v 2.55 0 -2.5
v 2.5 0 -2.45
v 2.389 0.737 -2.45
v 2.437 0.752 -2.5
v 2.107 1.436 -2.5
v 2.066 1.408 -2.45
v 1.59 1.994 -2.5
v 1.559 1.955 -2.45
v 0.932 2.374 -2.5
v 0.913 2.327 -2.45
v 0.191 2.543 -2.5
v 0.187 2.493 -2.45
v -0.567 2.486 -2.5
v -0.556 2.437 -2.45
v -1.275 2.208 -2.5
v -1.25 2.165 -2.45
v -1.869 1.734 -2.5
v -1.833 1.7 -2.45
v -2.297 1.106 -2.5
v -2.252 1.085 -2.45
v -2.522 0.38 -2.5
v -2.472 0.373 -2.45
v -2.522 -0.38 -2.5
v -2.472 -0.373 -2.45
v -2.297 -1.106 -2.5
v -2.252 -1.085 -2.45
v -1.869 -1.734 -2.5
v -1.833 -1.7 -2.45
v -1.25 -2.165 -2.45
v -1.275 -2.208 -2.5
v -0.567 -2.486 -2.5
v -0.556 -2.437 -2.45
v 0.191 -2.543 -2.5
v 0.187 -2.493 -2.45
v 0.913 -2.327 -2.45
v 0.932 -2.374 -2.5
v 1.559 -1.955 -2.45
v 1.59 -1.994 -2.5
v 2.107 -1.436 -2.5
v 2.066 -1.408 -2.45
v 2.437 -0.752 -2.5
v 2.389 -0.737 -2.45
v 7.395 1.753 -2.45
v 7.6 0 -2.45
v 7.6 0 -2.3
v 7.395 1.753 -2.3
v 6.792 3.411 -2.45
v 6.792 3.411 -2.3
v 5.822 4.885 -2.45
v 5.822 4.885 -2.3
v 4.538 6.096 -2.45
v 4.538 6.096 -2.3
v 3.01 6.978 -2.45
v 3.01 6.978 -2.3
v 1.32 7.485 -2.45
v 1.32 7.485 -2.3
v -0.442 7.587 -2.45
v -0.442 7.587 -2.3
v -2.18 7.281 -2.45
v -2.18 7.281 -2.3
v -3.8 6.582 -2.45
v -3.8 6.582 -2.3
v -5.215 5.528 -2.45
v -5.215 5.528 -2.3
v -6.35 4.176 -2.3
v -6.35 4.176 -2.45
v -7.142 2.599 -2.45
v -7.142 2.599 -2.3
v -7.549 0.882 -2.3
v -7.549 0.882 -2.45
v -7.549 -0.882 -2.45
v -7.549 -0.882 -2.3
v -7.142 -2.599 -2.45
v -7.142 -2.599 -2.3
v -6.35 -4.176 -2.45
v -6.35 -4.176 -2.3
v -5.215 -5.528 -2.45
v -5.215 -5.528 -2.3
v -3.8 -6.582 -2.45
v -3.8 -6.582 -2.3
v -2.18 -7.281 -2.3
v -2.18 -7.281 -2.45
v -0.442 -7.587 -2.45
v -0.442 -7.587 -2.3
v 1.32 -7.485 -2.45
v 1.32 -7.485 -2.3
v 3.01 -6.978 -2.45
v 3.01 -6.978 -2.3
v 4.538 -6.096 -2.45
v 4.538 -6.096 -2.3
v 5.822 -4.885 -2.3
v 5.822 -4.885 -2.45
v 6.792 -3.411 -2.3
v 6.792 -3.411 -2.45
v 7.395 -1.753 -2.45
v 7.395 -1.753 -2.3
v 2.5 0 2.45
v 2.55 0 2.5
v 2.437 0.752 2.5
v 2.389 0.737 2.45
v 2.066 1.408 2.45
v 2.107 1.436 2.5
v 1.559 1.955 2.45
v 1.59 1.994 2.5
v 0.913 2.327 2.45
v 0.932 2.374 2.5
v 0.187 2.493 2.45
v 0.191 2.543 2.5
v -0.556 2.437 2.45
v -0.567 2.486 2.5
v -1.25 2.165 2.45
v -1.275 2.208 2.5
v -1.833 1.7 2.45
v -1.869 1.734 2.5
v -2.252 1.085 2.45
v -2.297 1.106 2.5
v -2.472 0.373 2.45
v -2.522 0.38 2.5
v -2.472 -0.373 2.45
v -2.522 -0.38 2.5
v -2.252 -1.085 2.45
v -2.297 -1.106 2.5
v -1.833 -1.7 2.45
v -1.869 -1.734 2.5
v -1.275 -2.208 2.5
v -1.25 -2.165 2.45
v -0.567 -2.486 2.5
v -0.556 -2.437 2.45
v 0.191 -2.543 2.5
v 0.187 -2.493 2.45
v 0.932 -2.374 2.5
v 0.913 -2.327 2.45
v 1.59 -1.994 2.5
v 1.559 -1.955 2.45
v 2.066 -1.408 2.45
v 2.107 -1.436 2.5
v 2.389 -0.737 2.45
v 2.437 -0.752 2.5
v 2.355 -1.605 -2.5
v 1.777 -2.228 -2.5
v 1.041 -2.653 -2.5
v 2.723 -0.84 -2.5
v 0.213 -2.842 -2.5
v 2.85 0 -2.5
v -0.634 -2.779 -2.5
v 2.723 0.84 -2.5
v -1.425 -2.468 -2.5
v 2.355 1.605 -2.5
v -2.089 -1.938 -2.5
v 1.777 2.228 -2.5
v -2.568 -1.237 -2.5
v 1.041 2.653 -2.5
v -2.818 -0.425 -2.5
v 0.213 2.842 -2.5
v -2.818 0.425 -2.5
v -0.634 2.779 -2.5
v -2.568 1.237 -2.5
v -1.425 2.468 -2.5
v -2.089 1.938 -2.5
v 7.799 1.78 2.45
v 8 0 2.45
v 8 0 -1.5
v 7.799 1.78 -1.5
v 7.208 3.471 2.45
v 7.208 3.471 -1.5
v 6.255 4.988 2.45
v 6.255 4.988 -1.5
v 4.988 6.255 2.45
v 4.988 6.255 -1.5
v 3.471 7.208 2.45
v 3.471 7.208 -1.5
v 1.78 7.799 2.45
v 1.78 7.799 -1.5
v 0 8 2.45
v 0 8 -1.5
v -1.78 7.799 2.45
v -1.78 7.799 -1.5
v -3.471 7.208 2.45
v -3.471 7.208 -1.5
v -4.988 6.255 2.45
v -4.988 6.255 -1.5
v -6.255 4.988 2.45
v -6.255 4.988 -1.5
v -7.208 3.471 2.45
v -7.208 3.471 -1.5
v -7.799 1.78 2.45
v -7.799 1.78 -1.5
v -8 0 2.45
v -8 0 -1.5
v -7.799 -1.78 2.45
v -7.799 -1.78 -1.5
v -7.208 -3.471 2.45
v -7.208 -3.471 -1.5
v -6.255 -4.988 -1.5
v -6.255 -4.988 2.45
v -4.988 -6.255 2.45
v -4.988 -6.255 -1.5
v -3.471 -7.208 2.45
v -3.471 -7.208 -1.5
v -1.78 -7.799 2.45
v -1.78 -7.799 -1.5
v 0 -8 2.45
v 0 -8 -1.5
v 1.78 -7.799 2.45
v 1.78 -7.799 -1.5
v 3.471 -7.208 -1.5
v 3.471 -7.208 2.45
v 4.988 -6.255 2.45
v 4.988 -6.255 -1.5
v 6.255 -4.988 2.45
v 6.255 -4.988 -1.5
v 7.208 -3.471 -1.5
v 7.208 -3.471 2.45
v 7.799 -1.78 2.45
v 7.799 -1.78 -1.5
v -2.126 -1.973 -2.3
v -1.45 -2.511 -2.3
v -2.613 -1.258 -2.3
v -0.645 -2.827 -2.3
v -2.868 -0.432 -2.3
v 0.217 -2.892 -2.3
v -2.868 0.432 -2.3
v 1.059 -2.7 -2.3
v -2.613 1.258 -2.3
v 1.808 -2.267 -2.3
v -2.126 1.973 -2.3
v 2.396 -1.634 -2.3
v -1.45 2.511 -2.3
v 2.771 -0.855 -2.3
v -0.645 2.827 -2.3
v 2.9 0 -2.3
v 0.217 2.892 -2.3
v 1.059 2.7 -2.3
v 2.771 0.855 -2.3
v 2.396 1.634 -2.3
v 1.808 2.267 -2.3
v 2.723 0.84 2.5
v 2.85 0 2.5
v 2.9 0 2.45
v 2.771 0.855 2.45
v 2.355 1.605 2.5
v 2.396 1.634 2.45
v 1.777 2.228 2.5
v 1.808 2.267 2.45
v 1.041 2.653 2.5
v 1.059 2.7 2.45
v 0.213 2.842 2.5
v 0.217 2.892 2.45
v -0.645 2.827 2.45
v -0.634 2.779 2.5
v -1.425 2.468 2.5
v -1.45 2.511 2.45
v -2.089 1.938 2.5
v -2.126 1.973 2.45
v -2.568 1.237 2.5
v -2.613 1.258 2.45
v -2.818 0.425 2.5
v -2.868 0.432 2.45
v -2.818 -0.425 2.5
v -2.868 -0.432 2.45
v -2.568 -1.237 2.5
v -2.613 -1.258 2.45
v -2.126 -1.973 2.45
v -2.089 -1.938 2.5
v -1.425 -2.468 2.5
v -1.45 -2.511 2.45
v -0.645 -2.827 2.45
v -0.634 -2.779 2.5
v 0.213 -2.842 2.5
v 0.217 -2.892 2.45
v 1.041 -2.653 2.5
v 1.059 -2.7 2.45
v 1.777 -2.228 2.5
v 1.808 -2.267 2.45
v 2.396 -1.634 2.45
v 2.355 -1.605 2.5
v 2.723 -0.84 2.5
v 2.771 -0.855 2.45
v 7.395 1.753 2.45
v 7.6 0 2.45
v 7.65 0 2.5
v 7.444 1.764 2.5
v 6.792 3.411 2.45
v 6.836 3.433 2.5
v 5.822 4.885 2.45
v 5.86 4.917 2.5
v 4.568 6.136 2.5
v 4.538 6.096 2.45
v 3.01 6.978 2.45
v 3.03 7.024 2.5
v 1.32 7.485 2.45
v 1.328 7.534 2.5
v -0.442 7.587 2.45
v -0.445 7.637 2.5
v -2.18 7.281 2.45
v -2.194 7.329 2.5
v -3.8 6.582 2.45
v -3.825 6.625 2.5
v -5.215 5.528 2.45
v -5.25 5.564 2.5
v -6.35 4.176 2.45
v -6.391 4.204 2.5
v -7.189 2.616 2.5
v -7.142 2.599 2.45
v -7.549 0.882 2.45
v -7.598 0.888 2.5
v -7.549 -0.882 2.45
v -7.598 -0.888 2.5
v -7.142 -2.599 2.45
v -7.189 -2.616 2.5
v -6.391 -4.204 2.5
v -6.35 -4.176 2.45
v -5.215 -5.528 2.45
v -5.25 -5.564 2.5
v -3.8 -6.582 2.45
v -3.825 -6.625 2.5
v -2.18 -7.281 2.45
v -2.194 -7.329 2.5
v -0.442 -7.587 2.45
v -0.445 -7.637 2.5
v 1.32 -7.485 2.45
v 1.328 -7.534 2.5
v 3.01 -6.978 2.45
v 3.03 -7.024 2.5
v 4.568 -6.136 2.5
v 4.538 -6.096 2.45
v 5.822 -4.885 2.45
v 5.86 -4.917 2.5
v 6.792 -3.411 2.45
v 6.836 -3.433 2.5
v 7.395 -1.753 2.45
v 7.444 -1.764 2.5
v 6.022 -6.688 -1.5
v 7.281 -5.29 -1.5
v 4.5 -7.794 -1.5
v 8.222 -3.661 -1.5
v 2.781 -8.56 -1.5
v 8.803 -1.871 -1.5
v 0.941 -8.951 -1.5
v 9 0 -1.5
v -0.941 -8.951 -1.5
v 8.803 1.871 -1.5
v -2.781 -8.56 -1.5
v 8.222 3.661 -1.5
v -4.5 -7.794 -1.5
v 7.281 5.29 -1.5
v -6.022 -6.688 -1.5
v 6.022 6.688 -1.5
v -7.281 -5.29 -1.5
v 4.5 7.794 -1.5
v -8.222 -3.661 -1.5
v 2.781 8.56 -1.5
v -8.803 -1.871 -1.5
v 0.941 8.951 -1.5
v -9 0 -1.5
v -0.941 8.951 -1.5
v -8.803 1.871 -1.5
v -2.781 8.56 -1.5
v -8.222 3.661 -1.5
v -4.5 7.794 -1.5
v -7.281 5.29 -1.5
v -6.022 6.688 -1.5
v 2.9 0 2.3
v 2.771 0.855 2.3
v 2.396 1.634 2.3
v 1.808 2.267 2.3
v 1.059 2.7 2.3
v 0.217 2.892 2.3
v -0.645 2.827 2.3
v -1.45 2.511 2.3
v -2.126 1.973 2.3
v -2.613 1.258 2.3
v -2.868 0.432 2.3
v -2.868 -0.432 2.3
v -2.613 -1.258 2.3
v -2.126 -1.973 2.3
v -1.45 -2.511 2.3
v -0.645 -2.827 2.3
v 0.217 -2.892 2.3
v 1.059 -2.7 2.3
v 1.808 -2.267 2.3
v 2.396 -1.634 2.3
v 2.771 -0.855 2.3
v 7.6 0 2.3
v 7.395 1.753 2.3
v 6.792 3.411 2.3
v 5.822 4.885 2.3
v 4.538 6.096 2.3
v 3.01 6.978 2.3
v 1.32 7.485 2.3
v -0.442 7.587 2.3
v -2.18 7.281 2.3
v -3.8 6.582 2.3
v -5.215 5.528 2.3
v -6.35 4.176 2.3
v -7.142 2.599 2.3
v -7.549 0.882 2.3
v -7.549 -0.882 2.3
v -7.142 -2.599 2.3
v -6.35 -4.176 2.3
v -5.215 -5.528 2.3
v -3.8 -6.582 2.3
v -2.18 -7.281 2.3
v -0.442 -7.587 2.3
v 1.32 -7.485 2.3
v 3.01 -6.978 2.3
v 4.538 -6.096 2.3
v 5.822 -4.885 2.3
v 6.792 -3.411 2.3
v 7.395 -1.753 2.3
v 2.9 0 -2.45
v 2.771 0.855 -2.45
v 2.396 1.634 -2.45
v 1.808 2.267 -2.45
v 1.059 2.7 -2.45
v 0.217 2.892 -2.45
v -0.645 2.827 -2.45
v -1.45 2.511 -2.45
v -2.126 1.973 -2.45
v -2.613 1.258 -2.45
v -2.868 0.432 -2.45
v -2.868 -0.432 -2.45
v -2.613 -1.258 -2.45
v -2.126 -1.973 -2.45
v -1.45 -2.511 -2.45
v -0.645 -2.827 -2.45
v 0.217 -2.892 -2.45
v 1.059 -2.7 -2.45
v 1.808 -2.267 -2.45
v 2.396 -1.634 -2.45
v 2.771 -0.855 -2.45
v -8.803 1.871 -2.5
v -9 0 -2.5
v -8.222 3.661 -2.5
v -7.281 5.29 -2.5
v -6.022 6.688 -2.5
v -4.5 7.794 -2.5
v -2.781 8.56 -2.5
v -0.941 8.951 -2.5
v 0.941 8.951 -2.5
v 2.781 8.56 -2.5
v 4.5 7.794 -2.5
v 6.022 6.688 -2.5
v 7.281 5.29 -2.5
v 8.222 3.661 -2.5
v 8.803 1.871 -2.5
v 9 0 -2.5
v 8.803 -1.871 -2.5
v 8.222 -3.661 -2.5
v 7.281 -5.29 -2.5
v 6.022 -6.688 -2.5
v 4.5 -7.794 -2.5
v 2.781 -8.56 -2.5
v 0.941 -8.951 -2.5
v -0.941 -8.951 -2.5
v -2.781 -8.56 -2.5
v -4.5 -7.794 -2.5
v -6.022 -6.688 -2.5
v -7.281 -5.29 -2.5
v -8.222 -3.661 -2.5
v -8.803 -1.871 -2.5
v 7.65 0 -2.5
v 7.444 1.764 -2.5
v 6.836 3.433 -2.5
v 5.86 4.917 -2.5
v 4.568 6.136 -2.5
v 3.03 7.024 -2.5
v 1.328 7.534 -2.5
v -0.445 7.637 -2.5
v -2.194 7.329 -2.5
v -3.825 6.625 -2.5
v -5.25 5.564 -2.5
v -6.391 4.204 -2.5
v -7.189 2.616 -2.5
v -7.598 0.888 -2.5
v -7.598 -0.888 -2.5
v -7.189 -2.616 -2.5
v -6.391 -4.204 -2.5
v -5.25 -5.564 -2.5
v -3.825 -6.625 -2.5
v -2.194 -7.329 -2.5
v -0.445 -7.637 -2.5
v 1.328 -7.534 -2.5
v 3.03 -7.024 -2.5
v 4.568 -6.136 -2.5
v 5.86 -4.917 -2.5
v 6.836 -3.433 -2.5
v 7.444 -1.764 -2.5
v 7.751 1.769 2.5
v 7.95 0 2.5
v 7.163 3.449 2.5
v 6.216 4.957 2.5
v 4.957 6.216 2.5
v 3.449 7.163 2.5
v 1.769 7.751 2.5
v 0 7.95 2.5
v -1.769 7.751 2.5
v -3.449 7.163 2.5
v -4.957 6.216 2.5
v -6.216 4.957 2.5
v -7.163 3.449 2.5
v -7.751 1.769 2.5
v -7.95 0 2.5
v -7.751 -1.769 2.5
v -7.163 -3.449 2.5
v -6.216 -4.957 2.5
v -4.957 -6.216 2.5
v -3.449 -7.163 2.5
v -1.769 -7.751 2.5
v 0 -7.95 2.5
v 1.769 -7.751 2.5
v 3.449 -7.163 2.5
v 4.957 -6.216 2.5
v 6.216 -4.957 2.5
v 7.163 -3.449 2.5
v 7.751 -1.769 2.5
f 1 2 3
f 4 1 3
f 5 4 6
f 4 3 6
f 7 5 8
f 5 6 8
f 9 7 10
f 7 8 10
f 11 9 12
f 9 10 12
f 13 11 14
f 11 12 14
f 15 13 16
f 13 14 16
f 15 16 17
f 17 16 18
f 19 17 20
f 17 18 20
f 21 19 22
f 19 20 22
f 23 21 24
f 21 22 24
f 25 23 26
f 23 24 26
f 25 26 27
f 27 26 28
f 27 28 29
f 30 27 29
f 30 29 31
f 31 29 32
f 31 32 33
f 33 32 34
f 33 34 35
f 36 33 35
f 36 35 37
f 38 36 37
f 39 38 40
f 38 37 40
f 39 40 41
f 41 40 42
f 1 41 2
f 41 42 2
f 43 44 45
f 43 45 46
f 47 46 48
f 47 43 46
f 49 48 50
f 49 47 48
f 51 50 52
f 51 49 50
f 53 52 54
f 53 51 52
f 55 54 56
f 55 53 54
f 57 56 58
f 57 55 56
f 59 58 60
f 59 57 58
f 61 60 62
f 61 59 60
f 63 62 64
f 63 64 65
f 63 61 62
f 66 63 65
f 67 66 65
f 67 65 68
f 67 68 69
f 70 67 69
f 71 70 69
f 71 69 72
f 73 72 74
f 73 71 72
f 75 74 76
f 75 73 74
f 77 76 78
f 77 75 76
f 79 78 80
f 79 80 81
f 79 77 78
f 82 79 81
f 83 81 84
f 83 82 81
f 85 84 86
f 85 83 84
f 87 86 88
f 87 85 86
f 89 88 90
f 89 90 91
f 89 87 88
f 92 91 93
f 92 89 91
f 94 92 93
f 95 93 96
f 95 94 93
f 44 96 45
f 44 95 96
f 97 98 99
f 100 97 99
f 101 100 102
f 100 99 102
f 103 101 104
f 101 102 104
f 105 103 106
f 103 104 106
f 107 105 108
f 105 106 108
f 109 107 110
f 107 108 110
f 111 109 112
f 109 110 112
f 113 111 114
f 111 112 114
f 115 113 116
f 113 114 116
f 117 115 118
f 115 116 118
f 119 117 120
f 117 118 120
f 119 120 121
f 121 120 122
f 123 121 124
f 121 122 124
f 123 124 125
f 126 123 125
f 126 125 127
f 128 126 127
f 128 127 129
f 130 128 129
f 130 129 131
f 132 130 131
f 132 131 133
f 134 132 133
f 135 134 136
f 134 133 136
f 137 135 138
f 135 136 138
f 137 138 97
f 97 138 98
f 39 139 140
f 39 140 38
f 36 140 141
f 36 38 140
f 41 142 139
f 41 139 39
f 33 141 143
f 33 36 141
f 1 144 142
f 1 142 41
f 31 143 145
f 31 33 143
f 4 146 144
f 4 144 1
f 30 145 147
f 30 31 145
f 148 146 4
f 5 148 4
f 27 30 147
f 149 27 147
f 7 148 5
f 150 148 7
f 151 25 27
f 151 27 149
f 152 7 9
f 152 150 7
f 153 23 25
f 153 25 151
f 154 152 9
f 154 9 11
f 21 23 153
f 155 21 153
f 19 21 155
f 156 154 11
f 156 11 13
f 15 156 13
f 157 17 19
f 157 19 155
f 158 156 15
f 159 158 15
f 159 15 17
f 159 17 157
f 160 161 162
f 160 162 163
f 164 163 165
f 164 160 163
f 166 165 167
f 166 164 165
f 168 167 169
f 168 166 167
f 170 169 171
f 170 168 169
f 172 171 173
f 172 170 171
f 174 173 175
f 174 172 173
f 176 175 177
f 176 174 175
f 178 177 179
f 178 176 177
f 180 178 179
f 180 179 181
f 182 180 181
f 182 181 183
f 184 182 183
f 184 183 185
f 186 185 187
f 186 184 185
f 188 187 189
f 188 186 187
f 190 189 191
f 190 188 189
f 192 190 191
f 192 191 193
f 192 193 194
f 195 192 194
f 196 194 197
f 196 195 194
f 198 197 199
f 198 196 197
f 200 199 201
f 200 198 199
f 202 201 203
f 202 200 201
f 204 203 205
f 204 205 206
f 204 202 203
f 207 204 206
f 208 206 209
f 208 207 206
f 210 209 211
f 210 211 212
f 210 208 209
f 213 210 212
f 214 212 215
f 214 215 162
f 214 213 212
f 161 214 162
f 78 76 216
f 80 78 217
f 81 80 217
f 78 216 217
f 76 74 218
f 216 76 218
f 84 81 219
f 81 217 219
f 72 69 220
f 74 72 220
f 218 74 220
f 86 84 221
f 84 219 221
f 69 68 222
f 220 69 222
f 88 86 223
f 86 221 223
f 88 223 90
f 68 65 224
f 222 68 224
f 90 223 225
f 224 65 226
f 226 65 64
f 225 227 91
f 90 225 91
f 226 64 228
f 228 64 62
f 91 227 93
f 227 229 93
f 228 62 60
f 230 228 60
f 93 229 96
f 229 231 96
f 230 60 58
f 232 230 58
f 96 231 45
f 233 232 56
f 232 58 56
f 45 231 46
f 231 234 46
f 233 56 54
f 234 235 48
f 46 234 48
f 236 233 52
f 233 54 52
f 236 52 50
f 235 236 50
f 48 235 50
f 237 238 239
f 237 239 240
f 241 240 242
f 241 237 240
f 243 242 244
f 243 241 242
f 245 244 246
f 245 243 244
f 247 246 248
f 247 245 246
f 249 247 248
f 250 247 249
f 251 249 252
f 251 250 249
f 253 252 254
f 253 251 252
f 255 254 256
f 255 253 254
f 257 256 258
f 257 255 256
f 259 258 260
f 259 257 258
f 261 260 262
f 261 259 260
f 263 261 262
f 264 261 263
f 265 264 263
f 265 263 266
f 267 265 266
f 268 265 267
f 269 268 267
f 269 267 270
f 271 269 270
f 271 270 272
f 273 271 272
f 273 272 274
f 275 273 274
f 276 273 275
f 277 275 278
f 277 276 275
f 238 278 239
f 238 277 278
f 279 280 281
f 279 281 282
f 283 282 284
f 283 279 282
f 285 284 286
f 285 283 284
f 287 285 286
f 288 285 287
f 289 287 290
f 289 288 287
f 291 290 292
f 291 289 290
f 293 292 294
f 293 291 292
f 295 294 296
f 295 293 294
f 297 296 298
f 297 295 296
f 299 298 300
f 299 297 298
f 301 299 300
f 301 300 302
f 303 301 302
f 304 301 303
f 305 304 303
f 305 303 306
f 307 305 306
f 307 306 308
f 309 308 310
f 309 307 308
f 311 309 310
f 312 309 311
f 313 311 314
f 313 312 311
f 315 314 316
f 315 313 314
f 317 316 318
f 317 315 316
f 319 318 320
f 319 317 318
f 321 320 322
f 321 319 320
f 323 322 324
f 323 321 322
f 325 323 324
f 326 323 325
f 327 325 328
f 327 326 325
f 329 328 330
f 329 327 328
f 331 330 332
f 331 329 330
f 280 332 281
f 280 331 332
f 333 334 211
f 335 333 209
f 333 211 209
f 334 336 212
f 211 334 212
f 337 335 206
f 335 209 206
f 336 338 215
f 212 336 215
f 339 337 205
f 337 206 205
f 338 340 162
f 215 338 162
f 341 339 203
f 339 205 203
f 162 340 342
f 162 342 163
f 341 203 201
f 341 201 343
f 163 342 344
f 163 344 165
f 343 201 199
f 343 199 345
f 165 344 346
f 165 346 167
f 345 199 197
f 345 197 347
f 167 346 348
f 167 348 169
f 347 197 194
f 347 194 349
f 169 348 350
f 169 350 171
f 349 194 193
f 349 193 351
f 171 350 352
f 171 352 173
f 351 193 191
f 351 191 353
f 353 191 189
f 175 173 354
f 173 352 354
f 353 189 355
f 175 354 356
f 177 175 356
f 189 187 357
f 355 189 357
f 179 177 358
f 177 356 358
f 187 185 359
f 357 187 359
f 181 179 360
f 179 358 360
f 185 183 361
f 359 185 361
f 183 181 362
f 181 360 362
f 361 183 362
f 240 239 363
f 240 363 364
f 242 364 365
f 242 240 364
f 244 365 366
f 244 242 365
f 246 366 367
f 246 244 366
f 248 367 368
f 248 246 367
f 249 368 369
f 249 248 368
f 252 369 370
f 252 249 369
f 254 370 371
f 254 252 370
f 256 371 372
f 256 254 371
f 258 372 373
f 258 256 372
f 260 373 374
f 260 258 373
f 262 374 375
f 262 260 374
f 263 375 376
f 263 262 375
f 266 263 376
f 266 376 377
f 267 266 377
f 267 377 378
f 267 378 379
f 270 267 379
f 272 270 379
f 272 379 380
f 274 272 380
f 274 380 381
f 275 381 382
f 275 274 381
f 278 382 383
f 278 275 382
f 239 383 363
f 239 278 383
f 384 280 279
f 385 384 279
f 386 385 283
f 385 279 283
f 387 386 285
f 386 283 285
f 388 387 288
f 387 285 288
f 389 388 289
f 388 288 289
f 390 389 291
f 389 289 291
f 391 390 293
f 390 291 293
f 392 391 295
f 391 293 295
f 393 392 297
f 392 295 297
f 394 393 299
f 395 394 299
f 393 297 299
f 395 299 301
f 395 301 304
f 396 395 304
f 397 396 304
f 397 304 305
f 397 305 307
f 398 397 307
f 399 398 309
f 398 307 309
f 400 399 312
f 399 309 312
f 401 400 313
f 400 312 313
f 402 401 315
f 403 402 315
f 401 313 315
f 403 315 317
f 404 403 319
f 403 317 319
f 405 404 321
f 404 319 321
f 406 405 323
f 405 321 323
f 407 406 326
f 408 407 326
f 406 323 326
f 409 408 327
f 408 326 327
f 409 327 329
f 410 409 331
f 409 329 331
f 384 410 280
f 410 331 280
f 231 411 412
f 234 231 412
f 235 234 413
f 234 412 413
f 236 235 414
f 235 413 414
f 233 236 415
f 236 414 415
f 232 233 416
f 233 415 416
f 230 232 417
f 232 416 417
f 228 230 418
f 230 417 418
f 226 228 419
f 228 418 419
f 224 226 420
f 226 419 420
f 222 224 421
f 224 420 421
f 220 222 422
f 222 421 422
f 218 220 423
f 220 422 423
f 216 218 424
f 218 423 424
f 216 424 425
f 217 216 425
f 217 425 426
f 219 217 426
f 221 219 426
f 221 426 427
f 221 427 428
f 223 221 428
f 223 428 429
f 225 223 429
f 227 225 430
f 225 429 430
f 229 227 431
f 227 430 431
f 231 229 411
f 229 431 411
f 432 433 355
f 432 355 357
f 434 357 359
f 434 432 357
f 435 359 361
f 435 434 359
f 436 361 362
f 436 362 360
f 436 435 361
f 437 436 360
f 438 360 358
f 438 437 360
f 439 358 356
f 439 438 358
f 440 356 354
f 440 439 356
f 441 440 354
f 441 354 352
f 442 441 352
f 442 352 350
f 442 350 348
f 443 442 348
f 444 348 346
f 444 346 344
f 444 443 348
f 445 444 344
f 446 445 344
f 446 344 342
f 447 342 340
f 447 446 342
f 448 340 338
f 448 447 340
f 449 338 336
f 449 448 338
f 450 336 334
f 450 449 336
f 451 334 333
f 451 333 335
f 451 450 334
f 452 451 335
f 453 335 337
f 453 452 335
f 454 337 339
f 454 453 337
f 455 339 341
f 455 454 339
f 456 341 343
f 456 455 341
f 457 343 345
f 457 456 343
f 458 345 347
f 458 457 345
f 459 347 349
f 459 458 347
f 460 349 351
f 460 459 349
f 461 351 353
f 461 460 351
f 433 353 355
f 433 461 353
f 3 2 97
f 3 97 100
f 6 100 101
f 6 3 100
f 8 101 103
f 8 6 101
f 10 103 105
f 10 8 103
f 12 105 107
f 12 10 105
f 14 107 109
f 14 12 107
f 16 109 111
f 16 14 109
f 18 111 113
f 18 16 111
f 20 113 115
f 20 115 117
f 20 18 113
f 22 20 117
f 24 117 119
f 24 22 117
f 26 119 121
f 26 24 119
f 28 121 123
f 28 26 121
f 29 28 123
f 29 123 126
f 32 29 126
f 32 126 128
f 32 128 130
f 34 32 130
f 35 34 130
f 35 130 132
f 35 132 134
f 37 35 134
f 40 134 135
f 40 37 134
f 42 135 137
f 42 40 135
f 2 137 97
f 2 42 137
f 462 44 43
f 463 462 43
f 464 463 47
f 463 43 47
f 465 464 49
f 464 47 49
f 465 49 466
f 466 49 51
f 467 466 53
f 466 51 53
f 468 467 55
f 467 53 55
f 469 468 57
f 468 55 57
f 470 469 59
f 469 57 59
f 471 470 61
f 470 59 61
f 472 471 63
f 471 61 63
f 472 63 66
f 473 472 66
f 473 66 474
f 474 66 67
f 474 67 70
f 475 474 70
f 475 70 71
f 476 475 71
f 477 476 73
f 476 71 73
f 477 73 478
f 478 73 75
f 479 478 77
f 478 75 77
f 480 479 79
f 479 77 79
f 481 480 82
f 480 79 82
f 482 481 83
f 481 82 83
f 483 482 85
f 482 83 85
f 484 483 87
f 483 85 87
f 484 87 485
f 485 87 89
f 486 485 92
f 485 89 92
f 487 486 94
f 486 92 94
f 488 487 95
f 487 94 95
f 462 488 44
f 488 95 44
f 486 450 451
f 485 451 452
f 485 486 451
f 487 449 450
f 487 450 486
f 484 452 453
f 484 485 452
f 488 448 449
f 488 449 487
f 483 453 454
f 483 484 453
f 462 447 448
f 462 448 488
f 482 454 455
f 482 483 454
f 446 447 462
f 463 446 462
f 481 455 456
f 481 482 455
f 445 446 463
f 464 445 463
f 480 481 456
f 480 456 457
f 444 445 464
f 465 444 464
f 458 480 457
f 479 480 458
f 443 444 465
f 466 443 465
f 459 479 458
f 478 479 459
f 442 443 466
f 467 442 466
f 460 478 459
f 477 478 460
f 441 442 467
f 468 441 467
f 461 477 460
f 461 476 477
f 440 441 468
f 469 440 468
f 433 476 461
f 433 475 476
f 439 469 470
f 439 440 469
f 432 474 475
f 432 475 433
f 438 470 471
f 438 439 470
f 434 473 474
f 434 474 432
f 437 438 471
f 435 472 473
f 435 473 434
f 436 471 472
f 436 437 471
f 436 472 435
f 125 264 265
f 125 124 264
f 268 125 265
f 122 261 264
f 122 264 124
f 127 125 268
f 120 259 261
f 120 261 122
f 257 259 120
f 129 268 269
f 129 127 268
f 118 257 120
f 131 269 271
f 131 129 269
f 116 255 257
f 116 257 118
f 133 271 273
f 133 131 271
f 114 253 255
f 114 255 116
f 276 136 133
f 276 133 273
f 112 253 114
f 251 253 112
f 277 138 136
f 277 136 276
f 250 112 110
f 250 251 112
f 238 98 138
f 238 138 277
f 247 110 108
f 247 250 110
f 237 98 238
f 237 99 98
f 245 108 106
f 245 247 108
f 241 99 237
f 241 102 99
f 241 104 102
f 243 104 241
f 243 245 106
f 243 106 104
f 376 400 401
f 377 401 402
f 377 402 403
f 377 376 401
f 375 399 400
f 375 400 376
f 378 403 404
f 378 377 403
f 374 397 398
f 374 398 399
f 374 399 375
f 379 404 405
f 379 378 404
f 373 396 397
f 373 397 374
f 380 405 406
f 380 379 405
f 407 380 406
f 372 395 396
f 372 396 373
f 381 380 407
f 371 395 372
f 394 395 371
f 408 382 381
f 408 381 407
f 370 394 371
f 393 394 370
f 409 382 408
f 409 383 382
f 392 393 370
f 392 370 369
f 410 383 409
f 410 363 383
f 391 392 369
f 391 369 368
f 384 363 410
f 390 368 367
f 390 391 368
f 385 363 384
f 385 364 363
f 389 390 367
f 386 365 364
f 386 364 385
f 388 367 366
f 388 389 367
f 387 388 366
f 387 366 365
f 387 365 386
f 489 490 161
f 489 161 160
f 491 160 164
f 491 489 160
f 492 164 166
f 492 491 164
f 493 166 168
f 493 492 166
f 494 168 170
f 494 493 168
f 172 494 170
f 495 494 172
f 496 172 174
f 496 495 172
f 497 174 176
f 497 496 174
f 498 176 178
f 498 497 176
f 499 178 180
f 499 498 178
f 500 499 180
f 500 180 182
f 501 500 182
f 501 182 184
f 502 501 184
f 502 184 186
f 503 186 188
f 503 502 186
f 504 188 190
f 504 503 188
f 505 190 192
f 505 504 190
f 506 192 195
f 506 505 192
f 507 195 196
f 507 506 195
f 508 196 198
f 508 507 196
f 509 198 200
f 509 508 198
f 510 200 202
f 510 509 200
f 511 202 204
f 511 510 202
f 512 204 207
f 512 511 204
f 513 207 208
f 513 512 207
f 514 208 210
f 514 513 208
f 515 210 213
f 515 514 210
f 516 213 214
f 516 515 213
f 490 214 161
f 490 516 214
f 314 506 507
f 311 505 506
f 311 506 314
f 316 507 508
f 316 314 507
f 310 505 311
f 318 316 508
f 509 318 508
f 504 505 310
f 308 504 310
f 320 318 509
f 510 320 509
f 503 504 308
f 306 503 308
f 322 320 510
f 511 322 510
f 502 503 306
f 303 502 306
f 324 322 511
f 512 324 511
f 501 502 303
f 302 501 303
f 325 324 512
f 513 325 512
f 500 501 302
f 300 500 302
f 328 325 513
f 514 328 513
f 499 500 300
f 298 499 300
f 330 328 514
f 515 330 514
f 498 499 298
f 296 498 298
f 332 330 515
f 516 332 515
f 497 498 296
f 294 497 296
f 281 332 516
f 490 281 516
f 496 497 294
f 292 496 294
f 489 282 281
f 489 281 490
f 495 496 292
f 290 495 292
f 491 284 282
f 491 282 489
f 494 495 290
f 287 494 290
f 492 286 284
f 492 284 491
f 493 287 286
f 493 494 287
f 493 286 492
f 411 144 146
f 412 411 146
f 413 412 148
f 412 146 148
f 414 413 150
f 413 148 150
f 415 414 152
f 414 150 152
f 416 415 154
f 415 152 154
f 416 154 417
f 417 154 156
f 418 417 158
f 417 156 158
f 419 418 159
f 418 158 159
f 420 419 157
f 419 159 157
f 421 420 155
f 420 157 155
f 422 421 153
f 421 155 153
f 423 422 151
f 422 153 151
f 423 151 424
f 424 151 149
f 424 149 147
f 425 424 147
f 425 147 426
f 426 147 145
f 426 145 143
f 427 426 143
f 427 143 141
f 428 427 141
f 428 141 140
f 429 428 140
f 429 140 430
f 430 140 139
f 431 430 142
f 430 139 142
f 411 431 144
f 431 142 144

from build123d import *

# Parameters (mm, degrees)
SKETCH_1_R          = 8
SKETCH_1_R_2        = 2.5
EXTRUDE_1_DEPTH     = 2.5
SKETCH_3_R          = 9
SKETCH_3_R_2        = 2.5
EXTRUDE_2_DEPTH     = 1
SKETCH_4_R          = 7.6
SKETCH_4_R_2        = 2.9
CUT_EXTRUDE_1_DEPTH = 0.2
CHAMFER_1_SIZE      = 0.05


with BuildPart() as part:
    # 草图1 → 凸台-拉伸1 (new, symmetric)
    with BuildSketch(Plane.XY):
        Circle(SKETCH_1_R)
        Circle(SKETCH_1_R_2, mode=Mode.SUBTRACT)
    extrude(amount=EXTRUDE_1_DEPTH, both=True)

    # 草图3 → 凸台-拉伸2 (add)
    with BuildSketch(Plane(origin=(0, 0, -2.5), x_dir=(-1, 0, 0), z_dir=(0, 0, -1))):
        Circle(SKETCH_3_R)
        with Locations(Location((0, 0, 0), (0, 0, 180))):
            Circle(SKETCH_3_R_2, mode=Mode.SUBTRACT)
    extrude(amount=-EXTRUDE_2_DEPTH)

    # 草图4 → 切除-拉伸1 (cut)
    with BuildSketch(Plane.XY.offset(2.5)):
        Circle(SKETCH_4_R)
        Circle(SKETCH_4_R_2, mode=Mode.SUBTRACT)
    cut_extrude_1 = extrude(amount=-CUT_EXTRUDE_1_DEPTH, mode=Mode.SUBTRACT)

    # 镜向1: 切除-拉伸1 across plane
    add(cut_extrude_1.mirror(Plane.XY), mode=Mode.SUBTRACT)

    # 倒角1
    chamfer_1_edges = [part.edges().sort_by_distance(p)[0] for p in [
        (-7.6, 0, 2.5),
        (-2.9, 0, 2.5),
        (-2.9, 0, -2.5),
        (-7.6, 0, -2.5),
        (-8, 0, 2.5),
        (-2.5, 0, -2.5),
        (-2.5, 0, 2.5),
    ]]
    chamfer(chamfer_1_edges, length=CHAMFER_1_SIZE)


solid = part.part
